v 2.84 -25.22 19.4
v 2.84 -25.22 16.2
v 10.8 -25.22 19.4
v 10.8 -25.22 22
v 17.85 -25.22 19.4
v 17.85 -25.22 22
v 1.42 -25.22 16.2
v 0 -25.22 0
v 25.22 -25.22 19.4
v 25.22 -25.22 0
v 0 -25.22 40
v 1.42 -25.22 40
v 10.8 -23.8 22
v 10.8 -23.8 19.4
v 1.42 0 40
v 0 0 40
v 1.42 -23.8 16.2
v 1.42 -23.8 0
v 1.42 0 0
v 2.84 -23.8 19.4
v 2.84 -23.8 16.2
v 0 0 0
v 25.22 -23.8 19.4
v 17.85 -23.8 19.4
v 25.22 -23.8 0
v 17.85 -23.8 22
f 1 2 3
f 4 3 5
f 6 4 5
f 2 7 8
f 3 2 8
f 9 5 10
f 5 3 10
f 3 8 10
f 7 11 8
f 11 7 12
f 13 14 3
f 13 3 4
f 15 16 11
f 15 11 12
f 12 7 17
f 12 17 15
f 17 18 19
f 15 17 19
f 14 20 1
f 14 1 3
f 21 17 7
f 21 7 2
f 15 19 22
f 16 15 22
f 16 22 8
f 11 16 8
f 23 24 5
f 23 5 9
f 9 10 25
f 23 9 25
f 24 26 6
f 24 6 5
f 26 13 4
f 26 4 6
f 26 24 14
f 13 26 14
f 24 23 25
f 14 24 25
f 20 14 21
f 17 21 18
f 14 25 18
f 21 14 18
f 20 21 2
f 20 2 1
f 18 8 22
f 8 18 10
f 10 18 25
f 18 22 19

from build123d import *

# Parameters (mm, degrees)
EXTRUDE1_DEPTH     = 40
CUT_EXTRUDE3_DEPTH = 2.42


with BuildPart() as part:
    # Sketch1 → Extrude1 (new body)
    with BuildSketch(Plane.XY):
        Polygon((0, 0), (0, -25.22), (25.22, -25.22), (25.22, -23.8), (1.42, -23.8), (1.42, 0), align=None)
    extrude(amount=EXTRUDE1_DEPTH)

    # Sketch3 → Cut-Extrude3 (cut, through all)
    with BuildSketch(Plane(origin=(0, -23.8, 0), x_dir=(-1, 0, 0), z_dir=(0, 1, 0))):
        Polygon((-1.42, 40), (-1.42, 16.2), (-2.84, 16.2), (-2.84, 19.4), (-10.8, 19.4), (-10.8, 22), (-17.85, 22), (-17.85, 19.4), (-25.22, 19.4), (-25.22, 40), align=None)
    extrude(amount=-CUT_EXTRUDE3_DEPTH, mode=Mode.SUBTRACT)


solid = part.part
